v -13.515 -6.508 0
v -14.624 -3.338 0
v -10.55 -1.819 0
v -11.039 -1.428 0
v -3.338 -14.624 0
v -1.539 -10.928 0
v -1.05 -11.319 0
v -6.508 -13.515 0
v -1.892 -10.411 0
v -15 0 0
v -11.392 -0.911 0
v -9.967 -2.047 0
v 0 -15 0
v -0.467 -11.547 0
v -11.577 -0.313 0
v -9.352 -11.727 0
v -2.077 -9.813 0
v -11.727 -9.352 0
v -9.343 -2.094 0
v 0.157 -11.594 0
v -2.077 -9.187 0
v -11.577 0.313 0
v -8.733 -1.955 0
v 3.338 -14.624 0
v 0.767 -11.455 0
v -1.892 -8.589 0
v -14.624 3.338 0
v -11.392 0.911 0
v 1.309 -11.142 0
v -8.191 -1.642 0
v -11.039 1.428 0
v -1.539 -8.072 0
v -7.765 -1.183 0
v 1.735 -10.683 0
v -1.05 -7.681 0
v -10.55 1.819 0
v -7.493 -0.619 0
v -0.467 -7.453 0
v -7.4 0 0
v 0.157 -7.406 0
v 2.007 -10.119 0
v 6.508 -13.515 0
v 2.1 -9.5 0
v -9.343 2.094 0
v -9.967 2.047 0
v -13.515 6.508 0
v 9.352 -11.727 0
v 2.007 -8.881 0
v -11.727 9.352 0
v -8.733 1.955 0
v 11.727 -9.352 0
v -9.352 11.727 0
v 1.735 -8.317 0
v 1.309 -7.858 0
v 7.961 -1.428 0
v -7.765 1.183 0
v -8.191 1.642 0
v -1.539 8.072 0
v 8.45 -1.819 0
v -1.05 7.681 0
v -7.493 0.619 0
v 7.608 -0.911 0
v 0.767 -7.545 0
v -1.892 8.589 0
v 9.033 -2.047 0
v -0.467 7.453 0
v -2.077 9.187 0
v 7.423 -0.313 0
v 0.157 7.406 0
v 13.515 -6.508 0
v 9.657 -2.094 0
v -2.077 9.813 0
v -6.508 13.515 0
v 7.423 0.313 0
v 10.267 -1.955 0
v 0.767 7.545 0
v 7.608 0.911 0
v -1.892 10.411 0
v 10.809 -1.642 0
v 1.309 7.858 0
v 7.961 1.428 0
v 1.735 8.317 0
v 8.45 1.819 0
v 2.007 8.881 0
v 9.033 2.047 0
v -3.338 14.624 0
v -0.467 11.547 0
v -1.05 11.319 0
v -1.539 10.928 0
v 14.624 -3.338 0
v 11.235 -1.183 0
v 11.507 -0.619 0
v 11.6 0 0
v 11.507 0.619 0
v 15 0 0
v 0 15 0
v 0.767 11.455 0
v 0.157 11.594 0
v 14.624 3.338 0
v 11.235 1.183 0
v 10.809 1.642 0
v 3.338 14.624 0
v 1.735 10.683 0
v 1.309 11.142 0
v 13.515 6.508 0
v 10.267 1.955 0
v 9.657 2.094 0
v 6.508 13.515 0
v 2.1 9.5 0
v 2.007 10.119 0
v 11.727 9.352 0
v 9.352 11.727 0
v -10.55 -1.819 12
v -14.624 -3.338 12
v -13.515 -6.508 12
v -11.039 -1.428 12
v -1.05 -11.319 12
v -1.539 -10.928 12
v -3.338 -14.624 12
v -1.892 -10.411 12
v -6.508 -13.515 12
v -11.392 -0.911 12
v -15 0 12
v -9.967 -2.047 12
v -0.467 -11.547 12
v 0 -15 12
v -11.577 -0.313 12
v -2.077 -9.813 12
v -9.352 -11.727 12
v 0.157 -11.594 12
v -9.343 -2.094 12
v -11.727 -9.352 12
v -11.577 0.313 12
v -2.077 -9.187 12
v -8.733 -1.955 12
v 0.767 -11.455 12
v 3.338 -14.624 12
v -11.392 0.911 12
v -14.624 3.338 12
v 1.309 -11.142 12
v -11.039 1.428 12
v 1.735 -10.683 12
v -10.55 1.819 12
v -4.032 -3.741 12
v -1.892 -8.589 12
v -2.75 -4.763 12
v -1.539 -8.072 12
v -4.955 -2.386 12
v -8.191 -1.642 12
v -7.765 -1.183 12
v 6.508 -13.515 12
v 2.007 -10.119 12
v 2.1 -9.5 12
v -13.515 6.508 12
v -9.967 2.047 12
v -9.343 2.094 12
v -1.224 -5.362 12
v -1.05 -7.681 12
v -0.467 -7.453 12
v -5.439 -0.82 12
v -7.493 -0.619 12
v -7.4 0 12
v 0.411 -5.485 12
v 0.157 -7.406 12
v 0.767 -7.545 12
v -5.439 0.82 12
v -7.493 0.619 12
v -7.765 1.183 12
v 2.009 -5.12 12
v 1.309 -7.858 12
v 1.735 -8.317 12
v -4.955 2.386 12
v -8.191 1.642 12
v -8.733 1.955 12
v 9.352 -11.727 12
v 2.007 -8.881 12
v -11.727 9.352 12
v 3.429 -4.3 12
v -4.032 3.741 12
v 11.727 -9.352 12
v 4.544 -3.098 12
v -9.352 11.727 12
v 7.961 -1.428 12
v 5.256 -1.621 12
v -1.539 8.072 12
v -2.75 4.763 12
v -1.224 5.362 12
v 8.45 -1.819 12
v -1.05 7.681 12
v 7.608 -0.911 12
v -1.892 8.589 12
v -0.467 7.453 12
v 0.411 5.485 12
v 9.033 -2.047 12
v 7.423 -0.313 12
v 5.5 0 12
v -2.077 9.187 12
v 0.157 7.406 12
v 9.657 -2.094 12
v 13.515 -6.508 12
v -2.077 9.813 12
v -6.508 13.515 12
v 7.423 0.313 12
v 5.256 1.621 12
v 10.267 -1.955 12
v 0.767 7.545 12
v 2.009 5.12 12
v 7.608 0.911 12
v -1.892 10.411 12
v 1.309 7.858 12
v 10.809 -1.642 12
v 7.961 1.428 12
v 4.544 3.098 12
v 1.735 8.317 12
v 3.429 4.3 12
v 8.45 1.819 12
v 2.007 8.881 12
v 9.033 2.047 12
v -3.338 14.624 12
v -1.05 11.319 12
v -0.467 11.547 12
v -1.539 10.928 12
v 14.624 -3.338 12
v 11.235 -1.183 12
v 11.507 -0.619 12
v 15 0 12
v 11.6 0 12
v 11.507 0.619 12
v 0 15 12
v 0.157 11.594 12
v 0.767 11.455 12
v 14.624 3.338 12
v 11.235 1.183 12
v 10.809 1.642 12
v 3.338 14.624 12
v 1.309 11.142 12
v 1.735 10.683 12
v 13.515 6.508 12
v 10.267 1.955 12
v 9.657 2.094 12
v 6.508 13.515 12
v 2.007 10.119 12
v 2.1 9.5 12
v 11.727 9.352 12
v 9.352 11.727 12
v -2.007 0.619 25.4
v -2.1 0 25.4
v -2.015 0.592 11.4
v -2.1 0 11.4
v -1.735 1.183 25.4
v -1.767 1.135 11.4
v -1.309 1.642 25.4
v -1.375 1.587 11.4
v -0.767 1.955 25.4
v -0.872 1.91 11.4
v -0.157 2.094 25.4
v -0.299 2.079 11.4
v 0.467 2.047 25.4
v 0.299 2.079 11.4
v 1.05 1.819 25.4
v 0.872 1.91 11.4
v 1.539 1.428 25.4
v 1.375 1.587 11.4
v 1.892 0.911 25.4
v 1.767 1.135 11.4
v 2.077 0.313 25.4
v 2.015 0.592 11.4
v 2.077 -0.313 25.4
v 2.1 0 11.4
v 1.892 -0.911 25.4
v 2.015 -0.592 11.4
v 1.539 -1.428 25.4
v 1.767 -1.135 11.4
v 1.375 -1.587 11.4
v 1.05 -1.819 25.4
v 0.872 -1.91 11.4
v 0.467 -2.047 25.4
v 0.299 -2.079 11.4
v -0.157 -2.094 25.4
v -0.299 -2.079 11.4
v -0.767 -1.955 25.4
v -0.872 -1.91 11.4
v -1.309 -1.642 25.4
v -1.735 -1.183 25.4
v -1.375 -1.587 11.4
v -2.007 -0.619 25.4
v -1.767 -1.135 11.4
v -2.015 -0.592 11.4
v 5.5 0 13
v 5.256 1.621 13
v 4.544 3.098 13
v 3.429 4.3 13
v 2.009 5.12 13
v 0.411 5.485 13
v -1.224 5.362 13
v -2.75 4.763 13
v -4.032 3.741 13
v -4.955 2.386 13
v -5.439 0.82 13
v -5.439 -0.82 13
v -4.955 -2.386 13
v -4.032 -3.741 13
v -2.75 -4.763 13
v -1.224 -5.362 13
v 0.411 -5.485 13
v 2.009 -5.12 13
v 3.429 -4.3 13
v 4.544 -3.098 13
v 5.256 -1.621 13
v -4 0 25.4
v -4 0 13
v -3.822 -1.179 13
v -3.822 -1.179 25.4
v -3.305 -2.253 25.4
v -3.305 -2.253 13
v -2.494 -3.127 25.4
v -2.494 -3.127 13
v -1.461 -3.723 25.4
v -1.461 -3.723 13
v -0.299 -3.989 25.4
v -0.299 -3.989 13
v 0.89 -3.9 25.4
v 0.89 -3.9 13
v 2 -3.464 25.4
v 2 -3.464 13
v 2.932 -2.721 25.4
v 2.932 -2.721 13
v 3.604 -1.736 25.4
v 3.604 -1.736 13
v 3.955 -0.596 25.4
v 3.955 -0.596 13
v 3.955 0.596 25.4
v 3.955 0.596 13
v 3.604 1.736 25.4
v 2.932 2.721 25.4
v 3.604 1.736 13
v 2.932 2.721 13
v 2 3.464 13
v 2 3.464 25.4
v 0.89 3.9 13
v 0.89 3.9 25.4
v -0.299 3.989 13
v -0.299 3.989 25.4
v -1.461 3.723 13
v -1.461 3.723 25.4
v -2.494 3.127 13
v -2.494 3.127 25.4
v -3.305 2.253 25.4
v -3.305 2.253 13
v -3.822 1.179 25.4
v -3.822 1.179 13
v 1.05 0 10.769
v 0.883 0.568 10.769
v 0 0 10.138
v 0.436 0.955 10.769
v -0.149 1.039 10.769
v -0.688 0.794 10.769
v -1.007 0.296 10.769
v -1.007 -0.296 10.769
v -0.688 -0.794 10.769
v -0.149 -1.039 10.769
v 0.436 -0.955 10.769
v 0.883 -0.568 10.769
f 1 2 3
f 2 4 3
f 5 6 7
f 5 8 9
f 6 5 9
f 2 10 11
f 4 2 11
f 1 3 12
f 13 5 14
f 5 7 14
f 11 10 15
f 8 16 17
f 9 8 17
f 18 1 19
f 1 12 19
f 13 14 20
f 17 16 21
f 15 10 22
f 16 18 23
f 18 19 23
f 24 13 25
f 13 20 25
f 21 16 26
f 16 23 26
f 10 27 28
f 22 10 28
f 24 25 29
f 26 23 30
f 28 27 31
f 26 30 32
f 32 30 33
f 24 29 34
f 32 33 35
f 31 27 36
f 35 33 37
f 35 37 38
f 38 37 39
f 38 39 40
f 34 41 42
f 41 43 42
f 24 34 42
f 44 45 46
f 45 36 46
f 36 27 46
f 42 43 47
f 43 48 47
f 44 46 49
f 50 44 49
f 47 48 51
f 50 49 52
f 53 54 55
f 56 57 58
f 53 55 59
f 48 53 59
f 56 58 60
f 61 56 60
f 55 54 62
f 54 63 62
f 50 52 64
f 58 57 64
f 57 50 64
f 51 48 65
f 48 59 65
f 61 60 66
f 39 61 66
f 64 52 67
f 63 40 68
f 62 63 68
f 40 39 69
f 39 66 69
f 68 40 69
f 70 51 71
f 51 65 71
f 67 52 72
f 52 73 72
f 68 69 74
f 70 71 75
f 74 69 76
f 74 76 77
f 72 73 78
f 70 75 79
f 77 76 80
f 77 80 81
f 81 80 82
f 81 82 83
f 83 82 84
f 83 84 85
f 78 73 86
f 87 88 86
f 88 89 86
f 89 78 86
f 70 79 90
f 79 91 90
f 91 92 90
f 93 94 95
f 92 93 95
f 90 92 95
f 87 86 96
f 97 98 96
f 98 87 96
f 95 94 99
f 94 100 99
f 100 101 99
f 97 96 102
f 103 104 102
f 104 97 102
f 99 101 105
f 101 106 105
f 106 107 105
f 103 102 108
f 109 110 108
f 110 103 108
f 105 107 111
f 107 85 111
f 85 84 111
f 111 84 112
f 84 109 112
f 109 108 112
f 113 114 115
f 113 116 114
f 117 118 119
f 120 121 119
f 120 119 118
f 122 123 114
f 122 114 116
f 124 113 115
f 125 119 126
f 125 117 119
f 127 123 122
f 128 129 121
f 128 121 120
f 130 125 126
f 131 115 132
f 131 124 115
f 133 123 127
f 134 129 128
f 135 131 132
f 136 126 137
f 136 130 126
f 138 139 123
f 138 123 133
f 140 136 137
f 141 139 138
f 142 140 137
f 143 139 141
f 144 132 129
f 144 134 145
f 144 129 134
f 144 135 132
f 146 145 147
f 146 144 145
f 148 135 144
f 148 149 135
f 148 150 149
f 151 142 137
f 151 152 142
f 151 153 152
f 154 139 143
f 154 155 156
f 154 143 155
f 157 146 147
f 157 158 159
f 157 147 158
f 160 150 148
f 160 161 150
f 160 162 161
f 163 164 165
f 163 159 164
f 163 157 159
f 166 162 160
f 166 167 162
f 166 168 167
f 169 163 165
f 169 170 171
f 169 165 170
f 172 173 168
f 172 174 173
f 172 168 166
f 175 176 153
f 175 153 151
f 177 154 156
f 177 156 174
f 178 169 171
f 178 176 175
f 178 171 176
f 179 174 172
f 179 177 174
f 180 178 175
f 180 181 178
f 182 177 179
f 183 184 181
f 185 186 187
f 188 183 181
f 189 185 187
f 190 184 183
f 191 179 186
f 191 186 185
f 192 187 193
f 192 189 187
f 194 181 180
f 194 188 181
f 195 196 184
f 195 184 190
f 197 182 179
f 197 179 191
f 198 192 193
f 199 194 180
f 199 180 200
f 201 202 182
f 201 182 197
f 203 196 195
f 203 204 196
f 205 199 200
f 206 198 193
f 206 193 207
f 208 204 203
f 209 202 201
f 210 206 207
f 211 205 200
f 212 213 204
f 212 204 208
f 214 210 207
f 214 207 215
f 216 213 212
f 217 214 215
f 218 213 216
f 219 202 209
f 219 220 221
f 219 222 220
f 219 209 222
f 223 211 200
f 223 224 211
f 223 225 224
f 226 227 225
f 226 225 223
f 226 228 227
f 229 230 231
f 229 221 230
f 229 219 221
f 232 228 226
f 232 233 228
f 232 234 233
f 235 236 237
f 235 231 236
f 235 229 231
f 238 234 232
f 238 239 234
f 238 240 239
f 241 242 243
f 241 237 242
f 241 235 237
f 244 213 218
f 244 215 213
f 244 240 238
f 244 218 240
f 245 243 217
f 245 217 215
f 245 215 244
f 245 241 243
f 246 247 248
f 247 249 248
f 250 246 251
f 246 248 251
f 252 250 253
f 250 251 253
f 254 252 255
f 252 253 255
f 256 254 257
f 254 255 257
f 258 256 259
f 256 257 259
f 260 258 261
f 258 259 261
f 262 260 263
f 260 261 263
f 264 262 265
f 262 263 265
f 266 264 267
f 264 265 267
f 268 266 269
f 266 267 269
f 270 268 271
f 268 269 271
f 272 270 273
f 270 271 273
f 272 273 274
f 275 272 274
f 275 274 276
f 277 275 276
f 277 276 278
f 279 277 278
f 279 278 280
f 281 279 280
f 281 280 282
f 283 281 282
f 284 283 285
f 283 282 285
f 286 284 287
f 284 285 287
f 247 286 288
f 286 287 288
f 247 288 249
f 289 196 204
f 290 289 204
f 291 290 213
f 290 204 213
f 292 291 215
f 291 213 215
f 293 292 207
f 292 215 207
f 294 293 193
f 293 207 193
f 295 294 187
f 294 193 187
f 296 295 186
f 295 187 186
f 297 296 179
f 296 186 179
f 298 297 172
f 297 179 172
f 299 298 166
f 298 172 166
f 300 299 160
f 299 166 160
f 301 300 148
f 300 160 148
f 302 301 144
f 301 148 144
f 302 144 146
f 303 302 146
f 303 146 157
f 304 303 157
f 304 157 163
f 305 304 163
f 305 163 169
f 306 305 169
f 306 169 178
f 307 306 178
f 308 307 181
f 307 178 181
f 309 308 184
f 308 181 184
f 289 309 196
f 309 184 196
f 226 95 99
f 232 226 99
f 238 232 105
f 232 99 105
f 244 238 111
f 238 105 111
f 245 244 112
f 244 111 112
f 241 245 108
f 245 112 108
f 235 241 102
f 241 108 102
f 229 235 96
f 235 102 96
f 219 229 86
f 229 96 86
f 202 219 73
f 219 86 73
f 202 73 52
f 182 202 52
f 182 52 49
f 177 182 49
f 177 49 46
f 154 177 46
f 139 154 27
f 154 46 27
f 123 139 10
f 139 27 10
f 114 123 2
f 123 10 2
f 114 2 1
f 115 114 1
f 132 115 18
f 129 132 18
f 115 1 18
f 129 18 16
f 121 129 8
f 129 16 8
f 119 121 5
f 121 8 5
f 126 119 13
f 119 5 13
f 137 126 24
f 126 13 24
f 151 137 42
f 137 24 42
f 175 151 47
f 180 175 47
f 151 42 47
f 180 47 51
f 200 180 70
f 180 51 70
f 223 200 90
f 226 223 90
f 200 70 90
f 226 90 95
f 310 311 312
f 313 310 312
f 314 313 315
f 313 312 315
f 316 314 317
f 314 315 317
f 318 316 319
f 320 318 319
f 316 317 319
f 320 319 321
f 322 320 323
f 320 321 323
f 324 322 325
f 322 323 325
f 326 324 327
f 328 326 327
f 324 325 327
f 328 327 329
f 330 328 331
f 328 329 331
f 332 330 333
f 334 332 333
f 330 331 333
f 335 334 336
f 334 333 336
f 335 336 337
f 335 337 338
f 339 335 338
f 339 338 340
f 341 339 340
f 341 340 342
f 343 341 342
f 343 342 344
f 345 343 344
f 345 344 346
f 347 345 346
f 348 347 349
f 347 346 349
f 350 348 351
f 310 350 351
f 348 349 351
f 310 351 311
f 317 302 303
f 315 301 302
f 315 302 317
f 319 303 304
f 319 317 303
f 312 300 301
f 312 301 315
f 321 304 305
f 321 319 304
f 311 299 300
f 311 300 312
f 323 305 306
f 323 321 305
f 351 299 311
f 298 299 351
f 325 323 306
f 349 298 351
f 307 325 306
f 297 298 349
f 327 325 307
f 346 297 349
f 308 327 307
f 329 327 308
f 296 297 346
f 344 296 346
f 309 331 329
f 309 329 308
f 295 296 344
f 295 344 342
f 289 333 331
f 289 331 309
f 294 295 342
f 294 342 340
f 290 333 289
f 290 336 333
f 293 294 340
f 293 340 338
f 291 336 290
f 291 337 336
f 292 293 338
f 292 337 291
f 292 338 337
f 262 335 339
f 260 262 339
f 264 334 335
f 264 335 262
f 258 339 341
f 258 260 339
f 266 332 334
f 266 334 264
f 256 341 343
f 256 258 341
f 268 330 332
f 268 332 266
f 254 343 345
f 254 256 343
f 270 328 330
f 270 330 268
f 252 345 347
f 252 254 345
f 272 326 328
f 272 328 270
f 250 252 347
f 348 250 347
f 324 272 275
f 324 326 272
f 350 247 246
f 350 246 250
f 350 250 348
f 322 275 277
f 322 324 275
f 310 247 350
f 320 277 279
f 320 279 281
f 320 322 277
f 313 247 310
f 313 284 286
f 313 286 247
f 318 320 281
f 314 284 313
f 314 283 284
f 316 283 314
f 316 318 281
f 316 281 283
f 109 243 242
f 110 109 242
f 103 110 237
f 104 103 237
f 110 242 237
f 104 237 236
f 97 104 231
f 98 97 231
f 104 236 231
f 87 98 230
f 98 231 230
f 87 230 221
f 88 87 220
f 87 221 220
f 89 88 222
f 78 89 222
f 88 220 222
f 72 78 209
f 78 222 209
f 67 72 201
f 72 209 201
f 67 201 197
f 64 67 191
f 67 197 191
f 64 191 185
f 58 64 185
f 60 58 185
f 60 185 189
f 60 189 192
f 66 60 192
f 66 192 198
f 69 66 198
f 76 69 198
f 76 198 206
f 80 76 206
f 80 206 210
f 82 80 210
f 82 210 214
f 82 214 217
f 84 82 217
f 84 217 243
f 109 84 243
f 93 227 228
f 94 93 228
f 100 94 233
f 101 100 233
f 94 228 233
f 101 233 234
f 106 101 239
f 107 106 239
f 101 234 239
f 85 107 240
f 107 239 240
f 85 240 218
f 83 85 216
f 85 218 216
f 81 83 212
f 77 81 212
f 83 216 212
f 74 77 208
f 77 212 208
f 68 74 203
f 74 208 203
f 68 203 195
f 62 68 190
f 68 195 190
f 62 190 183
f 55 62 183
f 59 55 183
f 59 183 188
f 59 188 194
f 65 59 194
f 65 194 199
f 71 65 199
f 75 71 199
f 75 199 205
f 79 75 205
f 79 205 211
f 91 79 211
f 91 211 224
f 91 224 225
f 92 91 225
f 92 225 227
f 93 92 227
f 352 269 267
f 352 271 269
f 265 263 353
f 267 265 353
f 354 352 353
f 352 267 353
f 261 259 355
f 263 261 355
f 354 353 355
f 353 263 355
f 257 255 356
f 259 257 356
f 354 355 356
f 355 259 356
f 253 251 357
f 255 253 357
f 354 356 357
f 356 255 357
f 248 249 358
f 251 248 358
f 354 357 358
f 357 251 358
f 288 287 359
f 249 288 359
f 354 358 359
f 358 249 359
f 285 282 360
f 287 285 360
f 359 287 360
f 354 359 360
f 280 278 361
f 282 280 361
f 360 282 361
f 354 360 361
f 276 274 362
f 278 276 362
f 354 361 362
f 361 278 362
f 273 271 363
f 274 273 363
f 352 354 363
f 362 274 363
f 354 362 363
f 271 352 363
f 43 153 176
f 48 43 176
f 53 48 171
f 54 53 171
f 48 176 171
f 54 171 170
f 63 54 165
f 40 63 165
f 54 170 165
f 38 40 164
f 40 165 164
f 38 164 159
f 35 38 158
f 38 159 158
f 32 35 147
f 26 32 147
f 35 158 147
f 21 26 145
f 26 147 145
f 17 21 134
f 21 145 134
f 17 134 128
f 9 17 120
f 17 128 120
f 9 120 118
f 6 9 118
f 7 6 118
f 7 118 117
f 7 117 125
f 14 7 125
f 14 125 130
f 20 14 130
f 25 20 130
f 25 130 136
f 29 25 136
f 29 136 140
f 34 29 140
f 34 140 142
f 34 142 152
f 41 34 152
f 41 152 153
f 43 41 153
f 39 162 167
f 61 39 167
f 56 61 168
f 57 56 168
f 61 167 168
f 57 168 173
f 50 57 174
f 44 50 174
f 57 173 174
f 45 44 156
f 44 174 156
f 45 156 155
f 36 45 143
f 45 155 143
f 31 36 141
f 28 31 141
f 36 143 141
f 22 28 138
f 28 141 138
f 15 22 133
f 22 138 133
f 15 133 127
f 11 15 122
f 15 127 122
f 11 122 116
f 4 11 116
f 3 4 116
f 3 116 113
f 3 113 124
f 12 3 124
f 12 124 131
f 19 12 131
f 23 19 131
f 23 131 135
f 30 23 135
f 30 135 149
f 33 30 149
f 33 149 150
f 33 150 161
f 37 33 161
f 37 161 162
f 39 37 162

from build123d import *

# Parameters (mm, degrees)
SKETCH_1_R      = 15
EXTRUDE_1_DEPTH = 12
SKETCH_2_R      = 5.5
EXTRUDE_2_DEPTH = 1
SKETCH_3_R      = 4
EXTRUDE_3_DEPTH = 12.4
M5X0_81_D       = 4.2
M5X0_82_D       = 4.2
M5X0_82_DEPTH   = 14
M5X0_82_TIP     = 1.2618073


with BuildPart() as part:
    # Эскиз1 → Бобышка-Вытянуть1 (new body)
    with BuildSketch(Plane.XY):
        Circle(SKETCH_1_R)
    extrude(amount=EXTRUDE_1_DEPTH)

    # Эскиз2 → Бобышка-Вытянуть2 (add)
    with BuildSketch(Plane.XY.offset(12)):
        Circle(SKETCH_2_R)
    extrude(amount=EXTRUDE_2_DEPTH)

    # Эскиз3 → Бобышка-Вытянуть3 (add)
    with BuildSketch(Plane.XY.offset(13)):
        with Locations(Location((0, 0, 0), (0, 0, 180))):
            Circle(SKETCH_3_R)
    extrude(amount=EXTRUDE_3_DEPTH)

    # Отверстие обработанное метчиком M5x0.81 (through all)
    with Locations(Plane(origin=(0, 0, 0), x_dir=(-1, 0, 0), z_dir=(0, 0, -1))):
        with Locations((0, 9.5), (9.5, 0), (-9.5, 0), (0, -9.5)):
            Hole(M5X0_81_D / 2)

    # Отверстие обработанное метчиком M5x0.82
    with Locations(Plane.XY.offset(25.4)):
        with Locations((0, 0)):
            Hole(M5X0_82_D / 2, depth=M5X0_82_DEPTH)
            with Locations((0, 0, -(M5X0_82_DEPTH + M5X0_82_TIP / 2))):  # 118° drill point
                Cone(0, M5X0_82_D / 2, M5X0_82_TIP, mode=Mode.SUBTRACT)


solid = part.part
